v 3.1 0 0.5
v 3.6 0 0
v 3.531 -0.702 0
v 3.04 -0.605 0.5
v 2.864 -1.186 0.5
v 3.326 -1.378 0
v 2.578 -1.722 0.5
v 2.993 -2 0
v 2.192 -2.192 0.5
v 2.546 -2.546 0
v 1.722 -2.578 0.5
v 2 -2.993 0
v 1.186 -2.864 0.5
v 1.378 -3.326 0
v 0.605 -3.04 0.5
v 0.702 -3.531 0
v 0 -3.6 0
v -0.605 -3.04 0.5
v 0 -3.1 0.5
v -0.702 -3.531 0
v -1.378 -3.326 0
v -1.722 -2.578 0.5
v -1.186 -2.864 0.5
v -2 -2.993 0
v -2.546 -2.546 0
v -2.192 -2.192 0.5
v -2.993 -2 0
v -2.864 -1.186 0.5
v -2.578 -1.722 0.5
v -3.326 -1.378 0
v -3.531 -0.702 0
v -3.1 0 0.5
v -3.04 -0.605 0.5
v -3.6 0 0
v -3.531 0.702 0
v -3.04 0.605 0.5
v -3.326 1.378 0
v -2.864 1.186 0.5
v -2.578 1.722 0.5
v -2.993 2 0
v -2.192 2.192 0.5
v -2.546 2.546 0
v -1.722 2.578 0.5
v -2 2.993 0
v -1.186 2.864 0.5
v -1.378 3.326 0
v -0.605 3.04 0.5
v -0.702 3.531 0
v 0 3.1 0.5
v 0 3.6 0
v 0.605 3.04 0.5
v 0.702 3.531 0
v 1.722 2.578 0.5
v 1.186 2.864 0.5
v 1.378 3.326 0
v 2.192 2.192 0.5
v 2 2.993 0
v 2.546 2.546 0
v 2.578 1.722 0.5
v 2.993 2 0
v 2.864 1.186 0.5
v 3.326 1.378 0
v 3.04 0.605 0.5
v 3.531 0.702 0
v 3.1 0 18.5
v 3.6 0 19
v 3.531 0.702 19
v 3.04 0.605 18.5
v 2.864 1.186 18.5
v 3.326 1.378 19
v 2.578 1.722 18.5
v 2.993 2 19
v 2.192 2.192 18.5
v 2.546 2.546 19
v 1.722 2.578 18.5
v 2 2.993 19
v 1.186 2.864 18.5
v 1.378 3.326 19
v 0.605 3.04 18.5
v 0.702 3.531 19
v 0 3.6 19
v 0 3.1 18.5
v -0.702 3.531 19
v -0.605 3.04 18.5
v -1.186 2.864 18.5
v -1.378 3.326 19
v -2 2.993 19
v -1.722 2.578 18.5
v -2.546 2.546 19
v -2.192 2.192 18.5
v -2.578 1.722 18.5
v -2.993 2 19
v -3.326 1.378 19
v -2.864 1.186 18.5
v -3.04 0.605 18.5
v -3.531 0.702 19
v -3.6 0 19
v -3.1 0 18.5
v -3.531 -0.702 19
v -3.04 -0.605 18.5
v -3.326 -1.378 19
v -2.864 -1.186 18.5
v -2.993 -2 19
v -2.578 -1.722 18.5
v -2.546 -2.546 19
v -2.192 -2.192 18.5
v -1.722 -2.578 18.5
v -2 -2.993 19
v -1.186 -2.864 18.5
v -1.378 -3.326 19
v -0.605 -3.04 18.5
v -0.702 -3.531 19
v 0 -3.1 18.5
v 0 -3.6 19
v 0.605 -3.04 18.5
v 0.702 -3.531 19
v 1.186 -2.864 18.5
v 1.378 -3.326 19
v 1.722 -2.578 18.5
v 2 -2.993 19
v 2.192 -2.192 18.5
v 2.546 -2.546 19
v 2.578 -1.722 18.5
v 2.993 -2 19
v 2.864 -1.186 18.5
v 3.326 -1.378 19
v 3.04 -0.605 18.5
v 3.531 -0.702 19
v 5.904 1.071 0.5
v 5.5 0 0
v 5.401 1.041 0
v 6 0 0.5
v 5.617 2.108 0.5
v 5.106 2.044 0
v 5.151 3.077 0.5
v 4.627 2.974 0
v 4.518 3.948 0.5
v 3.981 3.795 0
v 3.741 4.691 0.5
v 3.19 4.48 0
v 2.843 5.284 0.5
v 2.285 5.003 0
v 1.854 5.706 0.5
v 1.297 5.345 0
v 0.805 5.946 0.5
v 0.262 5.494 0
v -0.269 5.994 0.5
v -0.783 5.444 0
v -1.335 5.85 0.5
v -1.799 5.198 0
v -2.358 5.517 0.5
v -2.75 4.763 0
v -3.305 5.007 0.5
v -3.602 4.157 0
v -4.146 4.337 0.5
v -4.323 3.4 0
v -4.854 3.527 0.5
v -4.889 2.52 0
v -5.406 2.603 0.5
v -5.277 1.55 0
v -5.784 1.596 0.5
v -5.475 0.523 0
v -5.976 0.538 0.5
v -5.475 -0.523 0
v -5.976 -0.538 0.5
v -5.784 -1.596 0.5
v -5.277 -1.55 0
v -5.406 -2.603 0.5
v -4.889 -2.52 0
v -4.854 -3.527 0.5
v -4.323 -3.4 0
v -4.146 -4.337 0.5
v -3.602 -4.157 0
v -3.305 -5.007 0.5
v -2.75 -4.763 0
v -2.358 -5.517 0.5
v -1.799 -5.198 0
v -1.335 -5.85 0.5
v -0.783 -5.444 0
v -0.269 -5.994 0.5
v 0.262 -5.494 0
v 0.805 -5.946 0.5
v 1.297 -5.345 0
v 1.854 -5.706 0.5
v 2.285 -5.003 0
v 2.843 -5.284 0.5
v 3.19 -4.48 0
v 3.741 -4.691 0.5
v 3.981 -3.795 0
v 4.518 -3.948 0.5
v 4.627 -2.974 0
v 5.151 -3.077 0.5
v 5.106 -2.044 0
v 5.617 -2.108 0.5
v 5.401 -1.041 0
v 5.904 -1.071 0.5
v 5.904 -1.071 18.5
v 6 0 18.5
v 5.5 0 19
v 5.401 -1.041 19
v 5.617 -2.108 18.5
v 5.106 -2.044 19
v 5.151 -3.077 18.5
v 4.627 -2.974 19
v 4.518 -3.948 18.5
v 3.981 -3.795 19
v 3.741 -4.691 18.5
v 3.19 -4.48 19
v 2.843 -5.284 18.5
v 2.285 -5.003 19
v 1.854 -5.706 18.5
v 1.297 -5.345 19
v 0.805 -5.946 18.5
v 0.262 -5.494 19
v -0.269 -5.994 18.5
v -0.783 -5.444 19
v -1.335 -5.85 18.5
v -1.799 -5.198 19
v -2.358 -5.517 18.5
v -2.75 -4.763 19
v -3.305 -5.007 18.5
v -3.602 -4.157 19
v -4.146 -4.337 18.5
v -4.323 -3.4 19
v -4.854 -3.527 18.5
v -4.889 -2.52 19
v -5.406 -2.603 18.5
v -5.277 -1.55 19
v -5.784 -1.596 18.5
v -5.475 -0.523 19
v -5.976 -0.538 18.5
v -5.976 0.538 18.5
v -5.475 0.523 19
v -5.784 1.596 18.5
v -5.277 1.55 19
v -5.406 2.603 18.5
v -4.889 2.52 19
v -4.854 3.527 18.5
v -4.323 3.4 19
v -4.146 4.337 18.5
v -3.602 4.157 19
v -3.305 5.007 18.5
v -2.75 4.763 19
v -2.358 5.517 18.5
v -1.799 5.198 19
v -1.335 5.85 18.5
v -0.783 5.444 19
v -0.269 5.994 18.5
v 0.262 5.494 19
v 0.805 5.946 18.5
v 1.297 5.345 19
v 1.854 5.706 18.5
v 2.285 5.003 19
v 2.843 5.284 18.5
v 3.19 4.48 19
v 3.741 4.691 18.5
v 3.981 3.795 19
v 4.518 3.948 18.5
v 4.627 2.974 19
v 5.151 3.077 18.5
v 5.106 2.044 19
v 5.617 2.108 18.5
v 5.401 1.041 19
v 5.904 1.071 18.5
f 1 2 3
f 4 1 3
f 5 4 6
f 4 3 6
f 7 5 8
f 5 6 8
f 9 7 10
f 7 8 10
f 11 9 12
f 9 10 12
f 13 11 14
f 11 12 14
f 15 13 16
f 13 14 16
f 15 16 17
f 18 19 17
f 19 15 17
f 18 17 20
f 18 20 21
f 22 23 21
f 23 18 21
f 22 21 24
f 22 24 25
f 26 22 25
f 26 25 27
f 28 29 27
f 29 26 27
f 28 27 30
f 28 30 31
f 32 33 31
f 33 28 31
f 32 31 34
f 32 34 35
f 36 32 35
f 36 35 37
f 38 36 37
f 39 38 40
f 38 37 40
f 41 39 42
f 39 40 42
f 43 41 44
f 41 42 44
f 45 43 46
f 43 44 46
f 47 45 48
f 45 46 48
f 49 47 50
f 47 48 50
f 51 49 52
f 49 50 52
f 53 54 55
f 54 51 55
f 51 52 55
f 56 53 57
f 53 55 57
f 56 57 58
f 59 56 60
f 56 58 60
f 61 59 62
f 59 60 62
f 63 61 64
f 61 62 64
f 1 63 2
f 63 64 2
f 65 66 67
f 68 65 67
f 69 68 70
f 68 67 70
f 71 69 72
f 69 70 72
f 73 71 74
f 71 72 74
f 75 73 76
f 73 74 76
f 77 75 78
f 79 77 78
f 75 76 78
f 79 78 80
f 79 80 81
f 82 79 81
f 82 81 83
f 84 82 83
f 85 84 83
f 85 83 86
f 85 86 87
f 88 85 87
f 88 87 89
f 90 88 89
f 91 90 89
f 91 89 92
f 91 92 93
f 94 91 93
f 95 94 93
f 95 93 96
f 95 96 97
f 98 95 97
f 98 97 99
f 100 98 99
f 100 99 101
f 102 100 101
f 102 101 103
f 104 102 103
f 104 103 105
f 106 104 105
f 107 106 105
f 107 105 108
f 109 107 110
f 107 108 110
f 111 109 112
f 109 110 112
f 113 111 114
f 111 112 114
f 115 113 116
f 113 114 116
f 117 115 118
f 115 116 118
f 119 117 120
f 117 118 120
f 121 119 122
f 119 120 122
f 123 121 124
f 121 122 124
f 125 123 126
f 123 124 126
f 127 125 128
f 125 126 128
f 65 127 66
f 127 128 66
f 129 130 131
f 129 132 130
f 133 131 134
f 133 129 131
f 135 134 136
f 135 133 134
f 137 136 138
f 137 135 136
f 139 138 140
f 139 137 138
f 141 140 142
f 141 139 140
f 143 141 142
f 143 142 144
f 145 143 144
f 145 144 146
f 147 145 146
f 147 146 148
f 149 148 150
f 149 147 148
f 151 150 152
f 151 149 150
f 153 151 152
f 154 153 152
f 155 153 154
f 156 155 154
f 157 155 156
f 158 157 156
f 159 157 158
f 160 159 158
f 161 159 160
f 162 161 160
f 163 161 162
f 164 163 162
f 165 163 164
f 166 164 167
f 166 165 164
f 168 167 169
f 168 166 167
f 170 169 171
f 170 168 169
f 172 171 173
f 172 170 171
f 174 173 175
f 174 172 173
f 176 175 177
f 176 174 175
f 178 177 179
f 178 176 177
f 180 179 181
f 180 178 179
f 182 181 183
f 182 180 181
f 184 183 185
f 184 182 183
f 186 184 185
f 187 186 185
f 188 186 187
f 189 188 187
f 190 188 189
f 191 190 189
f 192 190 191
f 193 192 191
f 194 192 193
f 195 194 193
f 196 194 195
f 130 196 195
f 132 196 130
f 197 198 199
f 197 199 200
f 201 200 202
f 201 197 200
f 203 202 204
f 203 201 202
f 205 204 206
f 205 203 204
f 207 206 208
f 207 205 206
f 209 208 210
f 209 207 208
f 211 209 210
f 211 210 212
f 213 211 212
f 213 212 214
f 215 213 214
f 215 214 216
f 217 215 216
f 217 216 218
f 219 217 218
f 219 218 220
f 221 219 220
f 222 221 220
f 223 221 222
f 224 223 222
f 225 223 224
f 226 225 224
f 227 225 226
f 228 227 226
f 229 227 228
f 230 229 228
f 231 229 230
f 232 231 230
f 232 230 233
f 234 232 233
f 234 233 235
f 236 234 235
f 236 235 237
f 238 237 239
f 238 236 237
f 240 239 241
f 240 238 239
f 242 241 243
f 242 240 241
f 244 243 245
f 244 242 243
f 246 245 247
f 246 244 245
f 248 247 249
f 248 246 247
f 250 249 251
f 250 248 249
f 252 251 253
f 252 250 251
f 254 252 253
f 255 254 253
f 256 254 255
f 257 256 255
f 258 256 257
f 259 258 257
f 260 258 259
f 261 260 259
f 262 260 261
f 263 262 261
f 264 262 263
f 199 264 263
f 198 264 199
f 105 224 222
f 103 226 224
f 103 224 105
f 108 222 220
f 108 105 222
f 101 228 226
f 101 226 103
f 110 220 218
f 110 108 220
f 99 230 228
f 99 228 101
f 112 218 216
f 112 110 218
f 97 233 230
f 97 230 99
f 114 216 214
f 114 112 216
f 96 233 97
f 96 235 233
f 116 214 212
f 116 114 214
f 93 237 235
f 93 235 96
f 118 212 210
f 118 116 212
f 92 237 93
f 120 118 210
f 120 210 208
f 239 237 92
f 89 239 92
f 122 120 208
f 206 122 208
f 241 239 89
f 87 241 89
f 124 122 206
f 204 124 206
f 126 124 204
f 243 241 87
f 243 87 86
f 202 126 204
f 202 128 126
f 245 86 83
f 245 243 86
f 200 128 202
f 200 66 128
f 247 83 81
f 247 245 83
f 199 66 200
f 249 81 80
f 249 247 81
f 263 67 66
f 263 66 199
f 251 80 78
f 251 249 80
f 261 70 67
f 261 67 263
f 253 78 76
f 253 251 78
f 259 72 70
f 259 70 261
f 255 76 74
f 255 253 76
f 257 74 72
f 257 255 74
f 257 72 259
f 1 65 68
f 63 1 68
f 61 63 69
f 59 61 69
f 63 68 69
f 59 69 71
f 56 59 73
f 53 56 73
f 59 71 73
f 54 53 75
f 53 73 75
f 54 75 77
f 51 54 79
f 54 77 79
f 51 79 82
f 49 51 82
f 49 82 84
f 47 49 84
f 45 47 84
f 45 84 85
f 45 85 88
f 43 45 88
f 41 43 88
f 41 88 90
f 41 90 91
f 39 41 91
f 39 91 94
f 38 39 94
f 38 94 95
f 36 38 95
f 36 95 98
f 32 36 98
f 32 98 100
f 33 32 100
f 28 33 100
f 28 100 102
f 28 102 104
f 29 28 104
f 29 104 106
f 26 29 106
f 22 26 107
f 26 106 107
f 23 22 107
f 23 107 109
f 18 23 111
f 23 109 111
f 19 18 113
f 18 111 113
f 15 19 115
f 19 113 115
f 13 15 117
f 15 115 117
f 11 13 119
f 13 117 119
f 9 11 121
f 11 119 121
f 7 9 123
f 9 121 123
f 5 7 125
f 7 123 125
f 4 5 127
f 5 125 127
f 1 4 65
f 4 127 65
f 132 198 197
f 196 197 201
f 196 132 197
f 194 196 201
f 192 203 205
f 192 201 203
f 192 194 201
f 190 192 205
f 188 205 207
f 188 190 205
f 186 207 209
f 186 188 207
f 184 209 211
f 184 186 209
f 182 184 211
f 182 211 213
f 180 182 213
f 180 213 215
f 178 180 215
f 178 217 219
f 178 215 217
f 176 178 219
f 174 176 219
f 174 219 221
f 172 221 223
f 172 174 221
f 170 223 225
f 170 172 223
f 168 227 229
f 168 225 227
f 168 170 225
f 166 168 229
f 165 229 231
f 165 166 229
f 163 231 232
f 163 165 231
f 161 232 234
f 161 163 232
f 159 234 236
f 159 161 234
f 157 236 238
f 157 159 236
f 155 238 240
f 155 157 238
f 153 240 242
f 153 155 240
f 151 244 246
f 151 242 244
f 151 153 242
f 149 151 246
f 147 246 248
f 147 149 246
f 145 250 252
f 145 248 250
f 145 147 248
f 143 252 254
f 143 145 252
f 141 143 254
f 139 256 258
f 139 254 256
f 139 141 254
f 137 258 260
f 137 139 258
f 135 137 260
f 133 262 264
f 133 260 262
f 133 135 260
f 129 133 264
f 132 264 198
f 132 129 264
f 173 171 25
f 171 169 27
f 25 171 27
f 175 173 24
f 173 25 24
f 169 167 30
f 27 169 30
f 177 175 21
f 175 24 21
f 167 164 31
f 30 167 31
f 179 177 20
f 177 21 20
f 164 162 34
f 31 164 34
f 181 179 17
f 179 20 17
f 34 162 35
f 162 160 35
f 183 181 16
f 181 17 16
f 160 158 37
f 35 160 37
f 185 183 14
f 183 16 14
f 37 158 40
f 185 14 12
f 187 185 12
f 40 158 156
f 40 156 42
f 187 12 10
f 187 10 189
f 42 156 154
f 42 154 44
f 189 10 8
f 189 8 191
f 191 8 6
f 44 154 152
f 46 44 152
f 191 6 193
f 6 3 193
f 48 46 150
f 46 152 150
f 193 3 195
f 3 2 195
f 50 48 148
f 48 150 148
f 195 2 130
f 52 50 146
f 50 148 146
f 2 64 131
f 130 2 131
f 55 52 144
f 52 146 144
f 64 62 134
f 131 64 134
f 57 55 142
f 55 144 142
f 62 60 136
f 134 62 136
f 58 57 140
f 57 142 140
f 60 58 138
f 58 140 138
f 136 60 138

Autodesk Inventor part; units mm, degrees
ref_plane "YZ Plane" through (0, 0, 0) normal (1, 0, 0) x (0, 1, 0)
ref_plane "XZ Plane" through (0, 0, 0) normal (0, 1, 0) x (-1, 0, 0)
ref_plane "XY Plane" through (0, 0, 0) normal (0, 0, 1) x (1, 0, 0)
sketch "Sketch1" plane through (0, 0, 0) normal (0, 0, 1) x (1, 0, 0)
  circle A0 centre (0, 0) radius 6
  dimension "d0" = 12
extrude "Extrusion1" add sketch "Sketch1" along normal blind 19
sketch "Sketch2" plane through (0, 0, 19) normal (0, 0, 1) x (1, 0, 0)
  circle A0 centre (0, 0) radius 6 projected
  circle A1 centre (0, 0) radius 3.1
  dimension "d3" = 6.2
extrude "Extrusion2" cut sketch "Sketch2" against normal blind 19 contours A1
chamfer "Chamfer1" distance 0.5 angle 45 4 edges at (-6, 0, 19) (-3.1, 0, 19) (-3.1, 0, 0) (-6, 0, 0)
properties part number "6mmLinearBearing"
